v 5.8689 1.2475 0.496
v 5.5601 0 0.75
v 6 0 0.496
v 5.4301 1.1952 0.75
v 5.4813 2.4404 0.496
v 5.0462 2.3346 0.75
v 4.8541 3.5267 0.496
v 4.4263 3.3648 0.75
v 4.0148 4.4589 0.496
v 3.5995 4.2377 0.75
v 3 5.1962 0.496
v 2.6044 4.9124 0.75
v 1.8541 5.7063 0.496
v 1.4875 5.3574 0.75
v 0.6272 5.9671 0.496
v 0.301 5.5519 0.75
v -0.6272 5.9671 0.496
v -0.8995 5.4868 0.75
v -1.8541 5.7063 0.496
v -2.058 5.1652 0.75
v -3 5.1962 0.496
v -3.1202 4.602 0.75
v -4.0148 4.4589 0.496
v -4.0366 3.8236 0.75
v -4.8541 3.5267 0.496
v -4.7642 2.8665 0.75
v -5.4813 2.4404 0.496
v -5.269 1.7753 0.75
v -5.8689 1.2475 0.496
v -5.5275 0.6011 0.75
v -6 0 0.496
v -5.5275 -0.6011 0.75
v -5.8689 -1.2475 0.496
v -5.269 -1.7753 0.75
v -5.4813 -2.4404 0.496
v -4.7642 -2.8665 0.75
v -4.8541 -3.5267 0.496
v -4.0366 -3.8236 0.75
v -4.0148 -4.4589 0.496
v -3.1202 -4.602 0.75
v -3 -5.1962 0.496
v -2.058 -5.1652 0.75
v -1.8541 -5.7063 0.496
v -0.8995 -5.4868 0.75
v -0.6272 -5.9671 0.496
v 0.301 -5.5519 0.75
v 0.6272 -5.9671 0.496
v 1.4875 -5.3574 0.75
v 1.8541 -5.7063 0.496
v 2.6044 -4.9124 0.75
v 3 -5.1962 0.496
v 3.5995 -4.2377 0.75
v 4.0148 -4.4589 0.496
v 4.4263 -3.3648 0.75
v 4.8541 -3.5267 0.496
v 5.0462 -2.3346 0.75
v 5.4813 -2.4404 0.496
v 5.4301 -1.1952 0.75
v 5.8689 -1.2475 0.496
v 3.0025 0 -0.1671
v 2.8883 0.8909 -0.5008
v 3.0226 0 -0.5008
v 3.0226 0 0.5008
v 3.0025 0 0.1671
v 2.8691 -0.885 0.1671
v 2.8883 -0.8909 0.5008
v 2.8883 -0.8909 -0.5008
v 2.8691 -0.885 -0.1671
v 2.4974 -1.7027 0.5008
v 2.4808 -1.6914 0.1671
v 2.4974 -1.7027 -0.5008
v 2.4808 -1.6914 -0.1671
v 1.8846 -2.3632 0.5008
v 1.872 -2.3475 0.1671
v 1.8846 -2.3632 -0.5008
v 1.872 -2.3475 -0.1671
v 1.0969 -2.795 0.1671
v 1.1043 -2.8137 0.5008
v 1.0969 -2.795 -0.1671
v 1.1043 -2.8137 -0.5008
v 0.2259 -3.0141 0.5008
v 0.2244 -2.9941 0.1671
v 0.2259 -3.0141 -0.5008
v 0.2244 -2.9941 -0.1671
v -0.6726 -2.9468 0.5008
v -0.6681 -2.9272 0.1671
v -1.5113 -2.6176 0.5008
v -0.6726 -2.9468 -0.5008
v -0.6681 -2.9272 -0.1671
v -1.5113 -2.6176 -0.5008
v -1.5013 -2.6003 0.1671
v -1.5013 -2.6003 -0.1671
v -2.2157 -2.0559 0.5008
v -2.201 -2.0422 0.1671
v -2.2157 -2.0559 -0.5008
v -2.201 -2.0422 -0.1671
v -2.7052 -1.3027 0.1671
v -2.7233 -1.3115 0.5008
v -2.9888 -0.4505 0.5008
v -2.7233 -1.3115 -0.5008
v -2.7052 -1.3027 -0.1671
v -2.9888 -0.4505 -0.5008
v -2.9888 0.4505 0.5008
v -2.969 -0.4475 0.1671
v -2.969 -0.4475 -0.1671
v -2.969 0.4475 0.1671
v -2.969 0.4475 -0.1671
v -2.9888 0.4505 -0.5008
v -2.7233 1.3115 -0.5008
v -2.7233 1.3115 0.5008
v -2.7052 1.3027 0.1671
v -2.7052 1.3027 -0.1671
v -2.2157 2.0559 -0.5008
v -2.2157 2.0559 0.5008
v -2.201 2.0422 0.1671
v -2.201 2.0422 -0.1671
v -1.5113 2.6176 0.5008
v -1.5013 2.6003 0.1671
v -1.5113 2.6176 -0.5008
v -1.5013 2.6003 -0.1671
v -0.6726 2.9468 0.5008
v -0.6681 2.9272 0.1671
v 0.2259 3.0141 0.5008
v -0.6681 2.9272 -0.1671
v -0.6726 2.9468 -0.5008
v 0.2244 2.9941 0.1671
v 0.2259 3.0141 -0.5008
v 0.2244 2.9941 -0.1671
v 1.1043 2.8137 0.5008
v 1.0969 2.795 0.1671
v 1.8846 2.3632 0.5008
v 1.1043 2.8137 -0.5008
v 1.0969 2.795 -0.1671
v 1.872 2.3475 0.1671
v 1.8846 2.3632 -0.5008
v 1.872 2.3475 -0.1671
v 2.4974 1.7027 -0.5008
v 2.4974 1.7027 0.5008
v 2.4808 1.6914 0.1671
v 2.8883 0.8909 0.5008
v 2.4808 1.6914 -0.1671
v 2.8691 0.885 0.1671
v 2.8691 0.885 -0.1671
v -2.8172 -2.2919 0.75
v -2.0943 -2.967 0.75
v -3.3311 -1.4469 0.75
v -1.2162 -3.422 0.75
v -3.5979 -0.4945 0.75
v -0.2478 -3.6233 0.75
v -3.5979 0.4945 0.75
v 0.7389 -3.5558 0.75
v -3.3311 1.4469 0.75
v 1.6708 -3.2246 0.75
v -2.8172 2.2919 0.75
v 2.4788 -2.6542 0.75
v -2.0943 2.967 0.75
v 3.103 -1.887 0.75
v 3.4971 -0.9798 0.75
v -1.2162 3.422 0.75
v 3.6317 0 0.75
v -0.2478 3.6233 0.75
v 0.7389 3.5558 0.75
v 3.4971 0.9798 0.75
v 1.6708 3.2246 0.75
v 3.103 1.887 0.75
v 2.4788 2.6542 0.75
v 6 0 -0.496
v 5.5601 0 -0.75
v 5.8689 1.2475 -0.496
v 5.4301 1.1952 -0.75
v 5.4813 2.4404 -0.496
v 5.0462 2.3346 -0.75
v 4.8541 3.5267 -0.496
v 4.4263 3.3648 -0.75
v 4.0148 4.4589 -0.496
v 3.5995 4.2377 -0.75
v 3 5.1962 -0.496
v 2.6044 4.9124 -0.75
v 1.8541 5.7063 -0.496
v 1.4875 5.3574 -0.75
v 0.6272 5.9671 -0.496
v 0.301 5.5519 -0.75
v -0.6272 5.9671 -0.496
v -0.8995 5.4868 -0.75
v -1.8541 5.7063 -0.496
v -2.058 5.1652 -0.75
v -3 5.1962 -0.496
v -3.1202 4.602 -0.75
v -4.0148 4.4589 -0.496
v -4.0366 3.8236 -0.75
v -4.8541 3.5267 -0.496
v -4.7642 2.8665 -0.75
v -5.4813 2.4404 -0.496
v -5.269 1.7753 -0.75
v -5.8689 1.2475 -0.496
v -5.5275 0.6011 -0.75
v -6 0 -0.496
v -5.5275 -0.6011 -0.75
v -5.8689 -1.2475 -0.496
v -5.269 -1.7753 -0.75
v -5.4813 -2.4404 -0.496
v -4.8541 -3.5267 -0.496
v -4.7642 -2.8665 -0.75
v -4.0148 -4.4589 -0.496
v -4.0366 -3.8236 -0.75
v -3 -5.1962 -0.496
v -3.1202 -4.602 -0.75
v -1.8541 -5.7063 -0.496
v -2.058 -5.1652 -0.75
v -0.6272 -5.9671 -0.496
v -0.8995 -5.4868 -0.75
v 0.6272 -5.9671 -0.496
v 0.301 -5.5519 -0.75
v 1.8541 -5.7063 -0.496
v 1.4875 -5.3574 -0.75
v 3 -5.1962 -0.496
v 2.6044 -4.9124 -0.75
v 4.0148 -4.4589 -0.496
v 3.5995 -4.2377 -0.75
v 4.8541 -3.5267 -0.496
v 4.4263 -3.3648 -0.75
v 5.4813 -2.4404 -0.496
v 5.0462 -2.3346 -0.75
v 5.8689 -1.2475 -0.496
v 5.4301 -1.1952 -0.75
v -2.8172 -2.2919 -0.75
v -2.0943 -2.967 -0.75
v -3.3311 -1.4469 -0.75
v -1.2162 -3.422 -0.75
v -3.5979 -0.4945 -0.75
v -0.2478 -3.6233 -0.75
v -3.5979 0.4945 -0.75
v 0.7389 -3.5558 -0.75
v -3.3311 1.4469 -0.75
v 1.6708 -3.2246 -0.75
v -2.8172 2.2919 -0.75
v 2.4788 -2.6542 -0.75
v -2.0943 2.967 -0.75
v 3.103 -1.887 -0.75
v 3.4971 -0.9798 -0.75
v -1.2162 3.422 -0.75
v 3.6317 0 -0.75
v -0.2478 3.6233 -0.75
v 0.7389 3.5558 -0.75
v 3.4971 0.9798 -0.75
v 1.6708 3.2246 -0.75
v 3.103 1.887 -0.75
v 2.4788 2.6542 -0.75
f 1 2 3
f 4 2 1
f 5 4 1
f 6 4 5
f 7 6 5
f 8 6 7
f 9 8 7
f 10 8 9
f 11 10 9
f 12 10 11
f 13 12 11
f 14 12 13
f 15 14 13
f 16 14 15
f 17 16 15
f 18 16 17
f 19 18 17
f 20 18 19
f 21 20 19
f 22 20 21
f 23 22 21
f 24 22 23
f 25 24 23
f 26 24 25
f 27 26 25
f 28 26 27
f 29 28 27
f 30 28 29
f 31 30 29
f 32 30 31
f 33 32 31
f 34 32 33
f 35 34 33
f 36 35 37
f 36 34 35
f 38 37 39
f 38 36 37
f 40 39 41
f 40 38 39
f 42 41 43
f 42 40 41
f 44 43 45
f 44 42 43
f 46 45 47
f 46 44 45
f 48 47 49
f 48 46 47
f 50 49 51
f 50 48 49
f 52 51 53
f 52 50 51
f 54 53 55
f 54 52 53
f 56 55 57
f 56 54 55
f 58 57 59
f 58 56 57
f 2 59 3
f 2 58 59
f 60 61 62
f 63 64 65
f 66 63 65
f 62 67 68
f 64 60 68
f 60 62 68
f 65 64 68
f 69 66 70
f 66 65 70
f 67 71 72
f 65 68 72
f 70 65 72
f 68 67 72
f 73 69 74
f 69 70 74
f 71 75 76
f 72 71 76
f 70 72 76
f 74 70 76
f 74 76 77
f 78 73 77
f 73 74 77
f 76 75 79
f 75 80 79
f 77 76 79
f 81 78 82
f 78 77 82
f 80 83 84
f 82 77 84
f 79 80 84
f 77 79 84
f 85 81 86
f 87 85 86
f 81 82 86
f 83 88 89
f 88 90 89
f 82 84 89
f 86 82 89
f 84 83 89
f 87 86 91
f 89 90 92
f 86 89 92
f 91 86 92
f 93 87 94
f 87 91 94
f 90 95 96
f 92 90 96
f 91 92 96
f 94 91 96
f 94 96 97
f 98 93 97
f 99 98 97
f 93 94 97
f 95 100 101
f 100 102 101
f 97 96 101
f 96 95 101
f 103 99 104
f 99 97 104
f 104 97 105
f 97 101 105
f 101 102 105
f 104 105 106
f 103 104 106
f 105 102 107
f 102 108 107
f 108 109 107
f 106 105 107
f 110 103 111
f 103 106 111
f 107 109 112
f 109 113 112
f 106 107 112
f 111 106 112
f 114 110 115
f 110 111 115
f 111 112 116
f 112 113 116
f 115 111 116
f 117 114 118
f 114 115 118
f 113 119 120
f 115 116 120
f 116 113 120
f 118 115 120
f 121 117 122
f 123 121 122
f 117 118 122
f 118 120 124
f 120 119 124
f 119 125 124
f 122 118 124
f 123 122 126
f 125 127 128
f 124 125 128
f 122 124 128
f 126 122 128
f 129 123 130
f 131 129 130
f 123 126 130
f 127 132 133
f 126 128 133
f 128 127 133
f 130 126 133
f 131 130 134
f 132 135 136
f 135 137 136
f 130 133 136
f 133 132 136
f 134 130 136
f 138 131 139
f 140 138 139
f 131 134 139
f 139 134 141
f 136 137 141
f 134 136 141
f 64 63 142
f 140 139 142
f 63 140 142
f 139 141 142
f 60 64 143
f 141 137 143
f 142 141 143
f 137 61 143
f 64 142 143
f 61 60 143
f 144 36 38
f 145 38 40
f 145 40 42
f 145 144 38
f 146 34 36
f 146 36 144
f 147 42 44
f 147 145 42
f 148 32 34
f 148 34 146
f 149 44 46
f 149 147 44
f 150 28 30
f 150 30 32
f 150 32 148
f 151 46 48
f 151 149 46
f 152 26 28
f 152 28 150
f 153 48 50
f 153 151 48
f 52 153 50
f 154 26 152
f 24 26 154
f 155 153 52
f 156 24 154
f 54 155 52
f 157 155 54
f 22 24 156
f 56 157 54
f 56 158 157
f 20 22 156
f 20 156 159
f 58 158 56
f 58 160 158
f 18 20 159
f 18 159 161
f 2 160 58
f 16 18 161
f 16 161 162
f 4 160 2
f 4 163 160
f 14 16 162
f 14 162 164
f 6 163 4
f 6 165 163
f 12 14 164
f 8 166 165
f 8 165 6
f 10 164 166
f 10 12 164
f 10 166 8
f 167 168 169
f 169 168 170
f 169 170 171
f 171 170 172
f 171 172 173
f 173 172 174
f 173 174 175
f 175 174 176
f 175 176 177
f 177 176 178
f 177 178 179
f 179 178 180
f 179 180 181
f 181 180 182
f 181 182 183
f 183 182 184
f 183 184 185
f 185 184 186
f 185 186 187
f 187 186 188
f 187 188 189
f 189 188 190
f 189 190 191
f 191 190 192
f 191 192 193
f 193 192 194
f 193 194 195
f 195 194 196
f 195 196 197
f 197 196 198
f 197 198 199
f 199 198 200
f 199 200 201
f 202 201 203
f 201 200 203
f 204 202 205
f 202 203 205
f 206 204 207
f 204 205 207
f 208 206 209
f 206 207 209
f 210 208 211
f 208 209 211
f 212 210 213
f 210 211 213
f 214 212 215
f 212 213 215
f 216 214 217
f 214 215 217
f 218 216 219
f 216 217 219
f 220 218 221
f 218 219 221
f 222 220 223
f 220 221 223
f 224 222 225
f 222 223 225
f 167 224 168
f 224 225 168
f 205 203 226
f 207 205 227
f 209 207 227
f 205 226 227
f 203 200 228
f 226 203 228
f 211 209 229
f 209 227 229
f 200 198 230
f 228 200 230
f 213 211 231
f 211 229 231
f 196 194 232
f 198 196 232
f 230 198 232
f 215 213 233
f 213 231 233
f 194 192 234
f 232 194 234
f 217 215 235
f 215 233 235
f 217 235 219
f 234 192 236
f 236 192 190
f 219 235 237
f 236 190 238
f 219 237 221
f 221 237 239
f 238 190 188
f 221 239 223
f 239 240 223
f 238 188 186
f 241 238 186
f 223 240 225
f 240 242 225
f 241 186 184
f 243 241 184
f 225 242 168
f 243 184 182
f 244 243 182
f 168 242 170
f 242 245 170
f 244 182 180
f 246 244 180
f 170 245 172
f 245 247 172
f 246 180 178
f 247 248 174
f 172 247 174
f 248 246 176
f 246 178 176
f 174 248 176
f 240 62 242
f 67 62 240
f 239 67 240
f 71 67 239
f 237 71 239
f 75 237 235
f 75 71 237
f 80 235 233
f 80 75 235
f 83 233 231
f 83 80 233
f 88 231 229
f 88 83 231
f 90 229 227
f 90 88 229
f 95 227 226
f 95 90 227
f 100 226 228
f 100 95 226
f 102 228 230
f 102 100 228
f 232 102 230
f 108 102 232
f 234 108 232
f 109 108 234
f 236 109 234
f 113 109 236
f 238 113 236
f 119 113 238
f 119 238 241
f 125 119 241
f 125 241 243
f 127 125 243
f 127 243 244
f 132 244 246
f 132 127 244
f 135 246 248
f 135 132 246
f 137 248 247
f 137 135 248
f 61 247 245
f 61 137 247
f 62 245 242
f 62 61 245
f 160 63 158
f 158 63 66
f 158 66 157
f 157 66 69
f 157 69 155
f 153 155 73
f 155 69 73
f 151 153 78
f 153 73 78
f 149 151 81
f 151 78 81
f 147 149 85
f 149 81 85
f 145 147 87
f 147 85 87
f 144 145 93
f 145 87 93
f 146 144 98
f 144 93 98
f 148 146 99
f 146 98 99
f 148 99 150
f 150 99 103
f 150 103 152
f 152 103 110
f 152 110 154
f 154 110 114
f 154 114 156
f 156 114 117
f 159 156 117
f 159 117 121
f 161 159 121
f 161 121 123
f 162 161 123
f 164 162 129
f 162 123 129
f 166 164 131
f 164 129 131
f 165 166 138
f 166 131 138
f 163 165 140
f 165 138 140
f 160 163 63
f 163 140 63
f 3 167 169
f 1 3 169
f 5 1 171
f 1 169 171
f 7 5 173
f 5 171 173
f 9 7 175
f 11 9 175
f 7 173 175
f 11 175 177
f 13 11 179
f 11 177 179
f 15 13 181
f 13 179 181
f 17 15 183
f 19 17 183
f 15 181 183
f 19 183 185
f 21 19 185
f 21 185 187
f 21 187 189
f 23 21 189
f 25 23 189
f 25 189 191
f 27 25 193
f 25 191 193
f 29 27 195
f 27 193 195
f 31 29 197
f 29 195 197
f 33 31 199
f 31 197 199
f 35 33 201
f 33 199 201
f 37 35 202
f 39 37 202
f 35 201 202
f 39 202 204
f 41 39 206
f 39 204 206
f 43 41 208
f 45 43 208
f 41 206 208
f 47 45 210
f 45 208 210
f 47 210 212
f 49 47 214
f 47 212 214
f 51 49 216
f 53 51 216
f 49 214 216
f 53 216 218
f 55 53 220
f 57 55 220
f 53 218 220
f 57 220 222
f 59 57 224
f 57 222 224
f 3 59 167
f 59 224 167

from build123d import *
from OCP.BRepFilletAPI import BRepFilletAPI_MakeChamfer

# Parameters (mm, degrees)
BOSS_EXTRUDE1_DEPTH      = 0.75
BOSS_EXTRUDE1_DEPTH_BACK = 0.75
SKETCH3_R                = 6
SKETCH3_R_2              = 3
CHAMFER1_SIZE            = 0.254
CHAMFER1_SIZE2           = 0.439940905
CHAMFER2_SIZE            = 0.580931391


with BuildPart() as part:
    # Sketch3 → Boss-Extrude1 (new, two sides: drawn at the far end of the back side and taken through both)
    with BuildSketch(Plane.XY.offset(-BOSS_EXTRUDE1_DEPTH_BACK)):
        Circle(SKETCH3_R)
        Circle(SKETCH3_R_2, mode=Mode.SUBTRACT)
    extrude(amount=BOSS_EXTRUDE1_DEPTH + BOSS_EXTRUDE1_DEPTH_BACK)

    # Chamfer1: one chamfer whose edges measure the first distance from different faces: ONE call of the kernel's chamfer builder (chamfer() names one face for all edges)
    chamfer1_edges_1 = [part.edges().sort_by_distance(p)[0] for p in [
        (-6, 0, 0.75),
    ]]
    chamfer1_side_1 = [part.faces().sort_by_distance(p)[0] for p in [
        (-6, 0, 0.375),
    ]]
    chamfer1_edges_2 = [part.edges().sort_by_distance(p)[0] for p in [
        (-6, 0, -0.75),
    ]]
    chamfer1_side_2 = [part.faces().sort_by_distance(p)[0] for p in [
        (-6, 0, -0.375),
    ]]
    chamfer1 = BRepFilletAPI_MakeChamfer(part.part.solid().wrapped)
    for e in chamfer1_edges_1:
        chamfer1.Add(CHAMFER1_SIZE, CHAMFER1_SIZE2, e.wrapped, chamfer1_side_1[0].wrapped)  # the first distance lies on this face
    for e in chamfer1_edges_2:
        chamfer1.Add(CHAMFER1_SIZE, CHAMFER1_SIZE2, e.wrapped, chamfer1_side_2[0].wrapped)  # the first distance lies on this face
    add(Compound.cast(chamfer1.Shape()), mode=Mode.REPLACE)

    # Sketch4 → Cut-Revolve1 (revolve, cut)
    with BuildSketch(Plane(origin=(0, 0, 0), x_dir=(0, 0, -1), z_dir=(1, 0, 0)), mode=Mode.PRIVATE) as cut_revolve1_sk:
        with BuildLine():
            Line((-0.75, 2.9492), (-0.75, 3.0508))
            ThreePointArc((-0.75, 3.0508), (0, 3), (0.75, 3.0508))
            Line((0.75, 3.0508), (0.75, 2.9492))
            Line((0.75, 2.9492), (-0.75, 2.9492))
        make_face()
    revolve(cut_revolve1_sk.sketch.rotate(Axis((0, 0, 0.75), (0, 0, -1)), 90), axis=Axis((0, 0, 0.75), (0, 0, -1)), mode=Mode.SUBTRACT)

    # Chamfer2
    # the kernel refuses this chamfer: 0.580931391, 0.254 mm, written as the material it takes off along each edge
    with BuildSketch(Plane(origin=(0, 0, -0.75), x_dir=(1, 0, 0), z_dir=(0, 1, 0))) as chamfer2_piece_1:
        with BuildLine():
            Line((3.0508 + CHAMFER2_SIZE, 0), (3.022591838, -0.249207666))
            ThreePointArc((3.022591838, -0.249207666), (3.034667103, -0.129981949), (3.0508, 0))
            Line((3.0508, 0), (3.0508 + CHAMFER2_SIZE, 0))
        make_face()
    revolve(axis=Axis((0, 0, -0.75), (0, 0, -1)), mode=Mode.SUBTRACT)
    with BuildSketch(Plane(origin=(0, 0, 0.75), x_dir=(1, 0, 0), z_dir=(0, 1, 0))) as chamfer2_piece_2:
        with BuildLine():
            Line((3.0508 + CHAMFER2_SIZE, 0), (3.022591838, 0.249207666))
            ThreePointArc((3.022591838, 0.249207666), (3.034667103, 0.129981949), (3.0508, 0))
            Line((3.0508, 0), (3.0508 + CHAMFER2_SIZE, 0))
        make_face()
    revolve(axis=Axis((0, 0, 0.75), (0, 0, -1)), mode=Mode.SUBTRACT)


solid = part.part
